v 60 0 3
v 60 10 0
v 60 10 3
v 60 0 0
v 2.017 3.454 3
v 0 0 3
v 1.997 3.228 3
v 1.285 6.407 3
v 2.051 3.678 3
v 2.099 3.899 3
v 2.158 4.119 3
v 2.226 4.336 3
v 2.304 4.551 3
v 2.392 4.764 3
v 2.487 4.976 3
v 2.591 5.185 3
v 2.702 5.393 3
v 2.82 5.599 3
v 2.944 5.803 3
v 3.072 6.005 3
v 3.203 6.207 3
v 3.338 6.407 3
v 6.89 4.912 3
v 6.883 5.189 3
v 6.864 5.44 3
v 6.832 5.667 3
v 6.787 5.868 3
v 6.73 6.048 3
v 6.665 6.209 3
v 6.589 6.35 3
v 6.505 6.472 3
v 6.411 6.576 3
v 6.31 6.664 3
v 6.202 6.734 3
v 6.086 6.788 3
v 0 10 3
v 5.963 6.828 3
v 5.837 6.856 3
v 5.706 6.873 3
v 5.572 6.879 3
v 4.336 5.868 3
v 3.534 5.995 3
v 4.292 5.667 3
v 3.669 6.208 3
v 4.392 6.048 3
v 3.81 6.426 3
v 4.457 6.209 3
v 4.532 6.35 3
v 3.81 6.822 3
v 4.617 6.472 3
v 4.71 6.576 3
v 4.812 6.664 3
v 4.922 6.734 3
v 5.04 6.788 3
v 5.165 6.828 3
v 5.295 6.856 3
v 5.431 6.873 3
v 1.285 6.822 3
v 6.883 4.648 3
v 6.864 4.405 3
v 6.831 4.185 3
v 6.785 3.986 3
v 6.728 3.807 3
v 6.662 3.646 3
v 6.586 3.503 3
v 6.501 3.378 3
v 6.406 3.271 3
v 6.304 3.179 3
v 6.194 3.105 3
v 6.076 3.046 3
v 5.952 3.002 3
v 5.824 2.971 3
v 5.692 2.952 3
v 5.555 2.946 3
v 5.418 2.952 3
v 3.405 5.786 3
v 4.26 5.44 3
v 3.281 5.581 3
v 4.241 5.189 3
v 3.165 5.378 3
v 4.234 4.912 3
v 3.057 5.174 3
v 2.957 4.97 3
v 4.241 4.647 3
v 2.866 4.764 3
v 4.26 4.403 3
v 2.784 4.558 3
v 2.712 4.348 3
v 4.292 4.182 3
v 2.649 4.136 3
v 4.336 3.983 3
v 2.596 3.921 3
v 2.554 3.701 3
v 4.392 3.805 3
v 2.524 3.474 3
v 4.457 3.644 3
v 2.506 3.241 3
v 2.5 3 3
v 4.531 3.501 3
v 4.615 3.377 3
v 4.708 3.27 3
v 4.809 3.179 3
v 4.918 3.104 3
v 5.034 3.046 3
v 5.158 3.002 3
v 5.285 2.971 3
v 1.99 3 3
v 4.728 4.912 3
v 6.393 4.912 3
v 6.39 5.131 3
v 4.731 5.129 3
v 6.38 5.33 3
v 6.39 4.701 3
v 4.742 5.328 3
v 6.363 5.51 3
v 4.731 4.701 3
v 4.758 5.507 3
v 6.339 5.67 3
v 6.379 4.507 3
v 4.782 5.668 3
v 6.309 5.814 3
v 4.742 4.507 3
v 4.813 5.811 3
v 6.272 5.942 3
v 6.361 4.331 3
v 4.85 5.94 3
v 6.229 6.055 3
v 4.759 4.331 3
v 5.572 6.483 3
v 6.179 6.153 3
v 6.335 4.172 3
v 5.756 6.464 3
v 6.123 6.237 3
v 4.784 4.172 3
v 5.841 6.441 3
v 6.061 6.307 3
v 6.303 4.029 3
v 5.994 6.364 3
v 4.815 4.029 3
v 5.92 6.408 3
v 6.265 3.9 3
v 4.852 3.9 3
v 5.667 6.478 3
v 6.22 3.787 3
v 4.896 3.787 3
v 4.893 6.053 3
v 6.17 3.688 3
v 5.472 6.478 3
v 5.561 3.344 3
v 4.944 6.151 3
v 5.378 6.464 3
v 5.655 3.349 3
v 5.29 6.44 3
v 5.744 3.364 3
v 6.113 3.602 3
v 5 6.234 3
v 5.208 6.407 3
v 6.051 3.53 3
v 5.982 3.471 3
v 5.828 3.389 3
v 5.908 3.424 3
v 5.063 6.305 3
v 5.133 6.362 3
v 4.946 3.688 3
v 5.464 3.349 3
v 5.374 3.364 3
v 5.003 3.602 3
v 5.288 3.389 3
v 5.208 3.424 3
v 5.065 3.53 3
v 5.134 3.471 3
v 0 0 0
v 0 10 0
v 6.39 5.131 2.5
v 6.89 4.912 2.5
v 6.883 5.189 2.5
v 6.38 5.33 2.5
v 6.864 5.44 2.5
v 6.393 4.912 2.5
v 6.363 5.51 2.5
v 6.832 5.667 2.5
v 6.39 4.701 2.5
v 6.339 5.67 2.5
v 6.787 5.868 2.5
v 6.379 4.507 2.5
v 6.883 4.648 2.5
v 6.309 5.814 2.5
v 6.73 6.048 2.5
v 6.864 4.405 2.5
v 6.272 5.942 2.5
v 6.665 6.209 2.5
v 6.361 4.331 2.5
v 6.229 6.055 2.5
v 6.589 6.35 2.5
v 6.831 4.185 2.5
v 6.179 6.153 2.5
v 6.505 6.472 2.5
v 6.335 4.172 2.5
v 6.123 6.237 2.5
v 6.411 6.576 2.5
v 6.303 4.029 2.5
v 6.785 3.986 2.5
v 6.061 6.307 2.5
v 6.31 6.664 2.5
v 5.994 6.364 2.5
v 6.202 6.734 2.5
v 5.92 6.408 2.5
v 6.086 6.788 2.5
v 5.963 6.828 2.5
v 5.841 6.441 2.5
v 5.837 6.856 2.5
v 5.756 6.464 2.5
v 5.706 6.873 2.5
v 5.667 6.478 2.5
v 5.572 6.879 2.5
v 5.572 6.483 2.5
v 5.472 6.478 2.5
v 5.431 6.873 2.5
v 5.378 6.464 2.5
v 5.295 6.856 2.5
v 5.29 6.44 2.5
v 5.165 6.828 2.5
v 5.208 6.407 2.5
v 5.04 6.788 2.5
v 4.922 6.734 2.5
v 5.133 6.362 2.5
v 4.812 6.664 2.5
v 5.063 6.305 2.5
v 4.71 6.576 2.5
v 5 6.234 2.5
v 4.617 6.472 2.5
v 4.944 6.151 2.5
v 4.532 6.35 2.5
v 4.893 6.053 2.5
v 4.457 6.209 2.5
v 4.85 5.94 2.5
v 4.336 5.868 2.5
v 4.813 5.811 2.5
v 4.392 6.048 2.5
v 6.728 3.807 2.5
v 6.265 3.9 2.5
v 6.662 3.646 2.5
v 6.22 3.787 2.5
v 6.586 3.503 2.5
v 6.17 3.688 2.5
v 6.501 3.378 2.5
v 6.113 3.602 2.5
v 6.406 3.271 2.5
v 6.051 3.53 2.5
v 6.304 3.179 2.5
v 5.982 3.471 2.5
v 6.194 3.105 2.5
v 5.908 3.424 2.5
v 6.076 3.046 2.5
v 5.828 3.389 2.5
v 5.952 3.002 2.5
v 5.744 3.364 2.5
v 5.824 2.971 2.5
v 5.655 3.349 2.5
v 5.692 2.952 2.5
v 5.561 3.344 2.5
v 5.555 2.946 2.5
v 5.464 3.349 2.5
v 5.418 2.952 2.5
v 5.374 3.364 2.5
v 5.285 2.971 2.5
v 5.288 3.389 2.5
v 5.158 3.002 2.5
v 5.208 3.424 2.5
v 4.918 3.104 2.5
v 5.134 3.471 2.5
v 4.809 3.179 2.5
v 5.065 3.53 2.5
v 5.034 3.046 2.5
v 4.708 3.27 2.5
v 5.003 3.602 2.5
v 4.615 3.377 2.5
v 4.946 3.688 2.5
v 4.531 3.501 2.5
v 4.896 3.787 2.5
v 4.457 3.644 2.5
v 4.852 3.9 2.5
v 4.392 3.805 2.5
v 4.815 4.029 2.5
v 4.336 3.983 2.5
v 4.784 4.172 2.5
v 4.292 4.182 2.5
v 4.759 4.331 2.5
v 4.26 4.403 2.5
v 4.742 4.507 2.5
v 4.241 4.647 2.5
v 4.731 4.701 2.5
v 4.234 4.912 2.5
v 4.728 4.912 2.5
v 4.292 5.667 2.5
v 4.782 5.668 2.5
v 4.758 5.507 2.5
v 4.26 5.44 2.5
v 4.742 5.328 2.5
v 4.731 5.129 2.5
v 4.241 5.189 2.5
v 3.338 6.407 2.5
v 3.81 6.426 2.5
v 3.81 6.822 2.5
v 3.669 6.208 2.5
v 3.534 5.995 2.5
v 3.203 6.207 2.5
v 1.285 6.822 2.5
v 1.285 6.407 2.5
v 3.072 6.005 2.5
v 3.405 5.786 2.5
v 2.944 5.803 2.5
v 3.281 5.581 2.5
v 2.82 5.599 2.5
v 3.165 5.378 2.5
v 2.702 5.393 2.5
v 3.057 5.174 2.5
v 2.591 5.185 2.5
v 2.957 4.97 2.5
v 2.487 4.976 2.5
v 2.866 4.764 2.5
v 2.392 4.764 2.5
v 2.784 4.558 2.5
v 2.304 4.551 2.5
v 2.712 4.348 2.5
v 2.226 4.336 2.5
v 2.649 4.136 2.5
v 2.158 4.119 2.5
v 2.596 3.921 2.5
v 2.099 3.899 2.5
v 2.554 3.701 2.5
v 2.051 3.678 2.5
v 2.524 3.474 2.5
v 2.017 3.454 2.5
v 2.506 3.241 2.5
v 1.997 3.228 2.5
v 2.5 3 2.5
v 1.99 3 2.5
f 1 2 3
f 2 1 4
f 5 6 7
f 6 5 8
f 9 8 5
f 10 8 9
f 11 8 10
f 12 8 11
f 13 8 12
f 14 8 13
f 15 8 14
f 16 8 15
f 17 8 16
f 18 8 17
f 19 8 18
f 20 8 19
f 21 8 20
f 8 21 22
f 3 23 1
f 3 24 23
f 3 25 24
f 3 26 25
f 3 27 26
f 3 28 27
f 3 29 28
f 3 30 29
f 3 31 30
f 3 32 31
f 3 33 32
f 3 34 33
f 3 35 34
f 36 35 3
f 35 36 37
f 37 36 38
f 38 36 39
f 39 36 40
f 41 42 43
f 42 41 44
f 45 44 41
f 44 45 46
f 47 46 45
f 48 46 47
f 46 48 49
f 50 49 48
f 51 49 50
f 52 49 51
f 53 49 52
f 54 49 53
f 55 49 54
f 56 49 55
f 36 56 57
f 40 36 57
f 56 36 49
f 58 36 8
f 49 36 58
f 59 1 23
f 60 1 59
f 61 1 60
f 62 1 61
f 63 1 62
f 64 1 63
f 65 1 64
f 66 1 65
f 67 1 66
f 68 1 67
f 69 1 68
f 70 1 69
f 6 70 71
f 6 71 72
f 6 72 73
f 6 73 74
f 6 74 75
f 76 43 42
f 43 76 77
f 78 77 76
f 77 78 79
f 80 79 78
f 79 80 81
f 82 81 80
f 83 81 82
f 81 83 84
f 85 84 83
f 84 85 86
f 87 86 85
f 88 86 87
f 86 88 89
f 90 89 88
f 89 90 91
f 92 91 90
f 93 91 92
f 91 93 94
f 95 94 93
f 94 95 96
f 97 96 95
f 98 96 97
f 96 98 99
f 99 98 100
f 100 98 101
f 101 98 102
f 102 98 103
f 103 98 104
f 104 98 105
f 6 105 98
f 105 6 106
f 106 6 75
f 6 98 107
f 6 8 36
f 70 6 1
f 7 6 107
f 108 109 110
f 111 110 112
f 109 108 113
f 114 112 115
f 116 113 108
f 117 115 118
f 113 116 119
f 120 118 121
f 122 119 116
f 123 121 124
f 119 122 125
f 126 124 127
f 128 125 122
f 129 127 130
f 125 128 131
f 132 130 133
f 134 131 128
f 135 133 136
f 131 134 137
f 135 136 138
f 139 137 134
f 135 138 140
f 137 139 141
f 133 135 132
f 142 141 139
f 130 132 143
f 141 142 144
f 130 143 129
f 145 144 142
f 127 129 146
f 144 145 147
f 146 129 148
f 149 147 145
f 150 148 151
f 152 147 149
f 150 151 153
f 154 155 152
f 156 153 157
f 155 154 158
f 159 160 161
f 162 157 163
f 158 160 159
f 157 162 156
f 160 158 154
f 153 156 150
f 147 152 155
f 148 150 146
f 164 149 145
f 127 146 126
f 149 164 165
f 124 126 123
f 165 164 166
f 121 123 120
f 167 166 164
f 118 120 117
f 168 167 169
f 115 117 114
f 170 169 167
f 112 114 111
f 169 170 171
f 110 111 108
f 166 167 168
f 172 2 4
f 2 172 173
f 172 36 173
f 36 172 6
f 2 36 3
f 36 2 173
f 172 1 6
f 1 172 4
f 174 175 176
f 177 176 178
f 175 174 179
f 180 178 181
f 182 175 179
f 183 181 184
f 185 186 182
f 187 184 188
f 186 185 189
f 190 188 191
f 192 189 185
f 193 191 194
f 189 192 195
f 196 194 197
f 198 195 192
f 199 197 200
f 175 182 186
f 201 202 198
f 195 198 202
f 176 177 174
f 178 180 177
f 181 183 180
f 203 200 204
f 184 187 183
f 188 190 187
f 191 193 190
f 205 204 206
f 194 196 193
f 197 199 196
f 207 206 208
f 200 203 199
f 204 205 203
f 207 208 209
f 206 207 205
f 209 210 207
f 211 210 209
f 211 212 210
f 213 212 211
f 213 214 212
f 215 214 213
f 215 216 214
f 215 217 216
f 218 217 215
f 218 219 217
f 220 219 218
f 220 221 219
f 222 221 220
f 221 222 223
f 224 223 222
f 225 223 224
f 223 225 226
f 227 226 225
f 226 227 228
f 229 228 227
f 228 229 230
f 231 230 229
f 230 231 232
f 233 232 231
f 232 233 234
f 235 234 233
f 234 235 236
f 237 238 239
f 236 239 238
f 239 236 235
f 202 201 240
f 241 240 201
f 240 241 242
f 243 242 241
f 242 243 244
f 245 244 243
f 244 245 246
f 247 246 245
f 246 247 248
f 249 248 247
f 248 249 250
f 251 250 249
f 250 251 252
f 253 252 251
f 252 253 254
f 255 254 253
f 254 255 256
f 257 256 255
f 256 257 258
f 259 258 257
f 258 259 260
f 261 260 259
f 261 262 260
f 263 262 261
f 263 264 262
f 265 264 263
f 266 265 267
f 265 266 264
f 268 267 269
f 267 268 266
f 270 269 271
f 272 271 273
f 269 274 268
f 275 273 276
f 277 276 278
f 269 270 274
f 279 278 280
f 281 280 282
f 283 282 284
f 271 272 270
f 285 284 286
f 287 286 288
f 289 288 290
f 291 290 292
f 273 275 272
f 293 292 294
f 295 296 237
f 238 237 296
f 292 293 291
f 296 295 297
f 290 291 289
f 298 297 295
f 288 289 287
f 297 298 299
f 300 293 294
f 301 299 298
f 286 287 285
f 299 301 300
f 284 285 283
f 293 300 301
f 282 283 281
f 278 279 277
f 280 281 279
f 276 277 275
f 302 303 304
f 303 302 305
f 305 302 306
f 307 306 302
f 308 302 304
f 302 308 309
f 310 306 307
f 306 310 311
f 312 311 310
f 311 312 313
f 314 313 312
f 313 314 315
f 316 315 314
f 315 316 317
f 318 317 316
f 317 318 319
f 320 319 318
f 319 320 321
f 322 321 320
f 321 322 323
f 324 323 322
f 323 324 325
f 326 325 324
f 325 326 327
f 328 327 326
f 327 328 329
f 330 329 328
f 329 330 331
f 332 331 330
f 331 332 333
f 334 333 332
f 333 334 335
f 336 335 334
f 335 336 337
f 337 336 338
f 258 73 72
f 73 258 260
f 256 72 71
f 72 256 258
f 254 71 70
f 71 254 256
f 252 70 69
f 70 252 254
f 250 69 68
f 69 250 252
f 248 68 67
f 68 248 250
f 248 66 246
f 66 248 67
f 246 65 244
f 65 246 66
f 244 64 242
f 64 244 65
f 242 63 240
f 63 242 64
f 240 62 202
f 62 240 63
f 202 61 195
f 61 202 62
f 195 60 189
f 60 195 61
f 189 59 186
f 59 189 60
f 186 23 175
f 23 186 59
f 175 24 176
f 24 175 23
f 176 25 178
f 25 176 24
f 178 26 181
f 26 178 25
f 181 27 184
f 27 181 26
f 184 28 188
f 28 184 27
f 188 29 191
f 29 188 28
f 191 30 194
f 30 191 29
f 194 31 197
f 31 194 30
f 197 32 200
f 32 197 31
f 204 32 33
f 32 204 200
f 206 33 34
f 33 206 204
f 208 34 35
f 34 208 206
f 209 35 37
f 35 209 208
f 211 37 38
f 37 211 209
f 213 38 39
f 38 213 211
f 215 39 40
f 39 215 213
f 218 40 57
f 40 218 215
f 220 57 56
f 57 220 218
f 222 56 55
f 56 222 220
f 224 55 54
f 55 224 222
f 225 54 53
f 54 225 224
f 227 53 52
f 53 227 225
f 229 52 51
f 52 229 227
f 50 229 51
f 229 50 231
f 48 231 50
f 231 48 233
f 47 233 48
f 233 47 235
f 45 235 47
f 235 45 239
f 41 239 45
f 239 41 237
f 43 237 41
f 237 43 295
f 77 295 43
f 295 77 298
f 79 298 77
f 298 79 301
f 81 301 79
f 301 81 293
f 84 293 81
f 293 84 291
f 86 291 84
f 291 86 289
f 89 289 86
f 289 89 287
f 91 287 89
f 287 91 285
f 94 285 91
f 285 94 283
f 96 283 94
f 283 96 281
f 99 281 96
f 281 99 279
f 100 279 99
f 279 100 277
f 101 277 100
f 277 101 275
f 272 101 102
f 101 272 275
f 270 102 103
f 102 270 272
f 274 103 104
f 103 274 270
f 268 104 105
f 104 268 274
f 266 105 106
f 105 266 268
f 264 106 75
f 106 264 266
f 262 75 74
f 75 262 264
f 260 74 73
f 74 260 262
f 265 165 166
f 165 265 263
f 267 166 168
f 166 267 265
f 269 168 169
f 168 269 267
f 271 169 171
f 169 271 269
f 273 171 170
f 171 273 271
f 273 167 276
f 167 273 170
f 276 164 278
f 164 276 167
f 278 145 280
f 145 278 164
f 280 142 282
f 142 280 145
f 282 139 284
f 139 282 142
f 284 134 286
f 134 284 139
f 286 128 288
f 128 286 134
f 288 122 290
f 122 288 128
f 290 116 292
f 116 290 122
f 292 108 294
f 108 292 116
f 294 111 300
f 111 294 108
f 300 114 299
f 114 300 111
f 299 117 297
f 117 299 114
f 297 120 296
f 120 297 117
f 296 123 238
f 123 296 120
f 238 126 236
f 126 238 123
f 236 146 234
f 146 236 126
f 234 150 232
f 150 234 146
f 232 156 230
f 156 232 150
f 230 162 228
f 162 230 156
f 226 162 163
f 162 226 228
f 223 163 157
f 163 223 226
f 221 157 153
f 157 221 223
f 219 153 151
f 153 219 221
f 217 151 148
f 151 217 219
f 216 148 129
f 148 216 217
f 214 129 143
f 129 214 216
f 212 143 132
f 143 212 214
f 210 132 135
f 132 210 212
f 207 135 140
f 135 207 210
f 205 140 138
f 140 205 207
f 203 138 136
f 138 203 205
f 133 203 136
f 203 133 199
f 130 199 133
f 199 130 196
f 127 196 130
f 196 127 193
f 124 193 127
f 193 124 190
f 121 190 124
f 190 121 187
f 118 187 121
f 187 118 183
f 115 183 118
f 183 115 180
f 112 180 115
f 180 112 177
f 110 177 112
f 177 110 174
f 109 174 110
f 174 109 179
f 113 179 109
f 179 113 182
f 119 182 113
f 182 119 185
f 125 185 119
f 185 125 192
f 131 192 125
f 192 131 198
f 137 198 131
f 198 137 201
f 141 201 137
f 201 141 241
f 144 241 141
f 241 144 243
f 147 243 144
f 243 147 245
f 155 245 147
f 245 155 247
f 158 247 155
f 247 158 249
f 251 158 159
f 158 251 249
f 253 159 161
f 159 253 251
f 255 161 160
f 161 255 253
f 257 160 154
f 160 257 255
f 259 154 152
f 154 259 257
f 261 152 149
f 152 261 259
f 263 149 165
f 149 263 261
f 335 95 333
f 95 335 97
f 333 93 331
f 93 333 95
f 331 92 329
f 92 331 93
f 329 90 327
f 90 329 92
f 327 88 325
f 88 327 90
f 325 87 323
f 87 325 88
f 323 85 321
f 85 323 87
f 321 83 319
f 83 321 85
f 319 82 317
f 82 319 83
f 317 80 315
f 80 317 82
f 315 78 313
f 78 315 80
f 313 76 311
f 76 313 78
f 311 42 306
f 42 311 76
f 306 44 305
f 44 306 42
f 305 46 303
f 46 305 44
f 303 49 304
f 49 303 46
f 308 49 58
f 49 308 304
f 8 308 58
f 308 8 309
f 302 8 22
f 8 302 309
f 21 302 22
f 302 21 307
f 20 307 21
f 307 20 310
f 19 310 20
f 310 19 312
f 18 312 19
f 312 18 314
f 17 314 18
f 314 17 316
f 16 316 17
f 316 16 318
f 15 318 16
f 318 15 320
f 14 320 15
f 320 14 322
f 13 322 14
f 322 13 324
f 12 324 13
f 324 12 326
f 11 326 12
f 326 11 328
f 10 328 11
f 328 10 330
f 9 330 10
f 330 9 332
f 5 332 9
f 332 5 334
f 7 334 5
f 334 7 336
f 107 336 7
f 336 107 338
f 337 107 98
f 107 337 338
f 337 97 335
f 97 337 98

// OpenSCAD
$fn = 25;

difference() {
  cube([60, 10, 3]);
  translate([1, 3, 2.5])
  linear_extrude(height = 1) {
    text("70", size=4);
  }
}
